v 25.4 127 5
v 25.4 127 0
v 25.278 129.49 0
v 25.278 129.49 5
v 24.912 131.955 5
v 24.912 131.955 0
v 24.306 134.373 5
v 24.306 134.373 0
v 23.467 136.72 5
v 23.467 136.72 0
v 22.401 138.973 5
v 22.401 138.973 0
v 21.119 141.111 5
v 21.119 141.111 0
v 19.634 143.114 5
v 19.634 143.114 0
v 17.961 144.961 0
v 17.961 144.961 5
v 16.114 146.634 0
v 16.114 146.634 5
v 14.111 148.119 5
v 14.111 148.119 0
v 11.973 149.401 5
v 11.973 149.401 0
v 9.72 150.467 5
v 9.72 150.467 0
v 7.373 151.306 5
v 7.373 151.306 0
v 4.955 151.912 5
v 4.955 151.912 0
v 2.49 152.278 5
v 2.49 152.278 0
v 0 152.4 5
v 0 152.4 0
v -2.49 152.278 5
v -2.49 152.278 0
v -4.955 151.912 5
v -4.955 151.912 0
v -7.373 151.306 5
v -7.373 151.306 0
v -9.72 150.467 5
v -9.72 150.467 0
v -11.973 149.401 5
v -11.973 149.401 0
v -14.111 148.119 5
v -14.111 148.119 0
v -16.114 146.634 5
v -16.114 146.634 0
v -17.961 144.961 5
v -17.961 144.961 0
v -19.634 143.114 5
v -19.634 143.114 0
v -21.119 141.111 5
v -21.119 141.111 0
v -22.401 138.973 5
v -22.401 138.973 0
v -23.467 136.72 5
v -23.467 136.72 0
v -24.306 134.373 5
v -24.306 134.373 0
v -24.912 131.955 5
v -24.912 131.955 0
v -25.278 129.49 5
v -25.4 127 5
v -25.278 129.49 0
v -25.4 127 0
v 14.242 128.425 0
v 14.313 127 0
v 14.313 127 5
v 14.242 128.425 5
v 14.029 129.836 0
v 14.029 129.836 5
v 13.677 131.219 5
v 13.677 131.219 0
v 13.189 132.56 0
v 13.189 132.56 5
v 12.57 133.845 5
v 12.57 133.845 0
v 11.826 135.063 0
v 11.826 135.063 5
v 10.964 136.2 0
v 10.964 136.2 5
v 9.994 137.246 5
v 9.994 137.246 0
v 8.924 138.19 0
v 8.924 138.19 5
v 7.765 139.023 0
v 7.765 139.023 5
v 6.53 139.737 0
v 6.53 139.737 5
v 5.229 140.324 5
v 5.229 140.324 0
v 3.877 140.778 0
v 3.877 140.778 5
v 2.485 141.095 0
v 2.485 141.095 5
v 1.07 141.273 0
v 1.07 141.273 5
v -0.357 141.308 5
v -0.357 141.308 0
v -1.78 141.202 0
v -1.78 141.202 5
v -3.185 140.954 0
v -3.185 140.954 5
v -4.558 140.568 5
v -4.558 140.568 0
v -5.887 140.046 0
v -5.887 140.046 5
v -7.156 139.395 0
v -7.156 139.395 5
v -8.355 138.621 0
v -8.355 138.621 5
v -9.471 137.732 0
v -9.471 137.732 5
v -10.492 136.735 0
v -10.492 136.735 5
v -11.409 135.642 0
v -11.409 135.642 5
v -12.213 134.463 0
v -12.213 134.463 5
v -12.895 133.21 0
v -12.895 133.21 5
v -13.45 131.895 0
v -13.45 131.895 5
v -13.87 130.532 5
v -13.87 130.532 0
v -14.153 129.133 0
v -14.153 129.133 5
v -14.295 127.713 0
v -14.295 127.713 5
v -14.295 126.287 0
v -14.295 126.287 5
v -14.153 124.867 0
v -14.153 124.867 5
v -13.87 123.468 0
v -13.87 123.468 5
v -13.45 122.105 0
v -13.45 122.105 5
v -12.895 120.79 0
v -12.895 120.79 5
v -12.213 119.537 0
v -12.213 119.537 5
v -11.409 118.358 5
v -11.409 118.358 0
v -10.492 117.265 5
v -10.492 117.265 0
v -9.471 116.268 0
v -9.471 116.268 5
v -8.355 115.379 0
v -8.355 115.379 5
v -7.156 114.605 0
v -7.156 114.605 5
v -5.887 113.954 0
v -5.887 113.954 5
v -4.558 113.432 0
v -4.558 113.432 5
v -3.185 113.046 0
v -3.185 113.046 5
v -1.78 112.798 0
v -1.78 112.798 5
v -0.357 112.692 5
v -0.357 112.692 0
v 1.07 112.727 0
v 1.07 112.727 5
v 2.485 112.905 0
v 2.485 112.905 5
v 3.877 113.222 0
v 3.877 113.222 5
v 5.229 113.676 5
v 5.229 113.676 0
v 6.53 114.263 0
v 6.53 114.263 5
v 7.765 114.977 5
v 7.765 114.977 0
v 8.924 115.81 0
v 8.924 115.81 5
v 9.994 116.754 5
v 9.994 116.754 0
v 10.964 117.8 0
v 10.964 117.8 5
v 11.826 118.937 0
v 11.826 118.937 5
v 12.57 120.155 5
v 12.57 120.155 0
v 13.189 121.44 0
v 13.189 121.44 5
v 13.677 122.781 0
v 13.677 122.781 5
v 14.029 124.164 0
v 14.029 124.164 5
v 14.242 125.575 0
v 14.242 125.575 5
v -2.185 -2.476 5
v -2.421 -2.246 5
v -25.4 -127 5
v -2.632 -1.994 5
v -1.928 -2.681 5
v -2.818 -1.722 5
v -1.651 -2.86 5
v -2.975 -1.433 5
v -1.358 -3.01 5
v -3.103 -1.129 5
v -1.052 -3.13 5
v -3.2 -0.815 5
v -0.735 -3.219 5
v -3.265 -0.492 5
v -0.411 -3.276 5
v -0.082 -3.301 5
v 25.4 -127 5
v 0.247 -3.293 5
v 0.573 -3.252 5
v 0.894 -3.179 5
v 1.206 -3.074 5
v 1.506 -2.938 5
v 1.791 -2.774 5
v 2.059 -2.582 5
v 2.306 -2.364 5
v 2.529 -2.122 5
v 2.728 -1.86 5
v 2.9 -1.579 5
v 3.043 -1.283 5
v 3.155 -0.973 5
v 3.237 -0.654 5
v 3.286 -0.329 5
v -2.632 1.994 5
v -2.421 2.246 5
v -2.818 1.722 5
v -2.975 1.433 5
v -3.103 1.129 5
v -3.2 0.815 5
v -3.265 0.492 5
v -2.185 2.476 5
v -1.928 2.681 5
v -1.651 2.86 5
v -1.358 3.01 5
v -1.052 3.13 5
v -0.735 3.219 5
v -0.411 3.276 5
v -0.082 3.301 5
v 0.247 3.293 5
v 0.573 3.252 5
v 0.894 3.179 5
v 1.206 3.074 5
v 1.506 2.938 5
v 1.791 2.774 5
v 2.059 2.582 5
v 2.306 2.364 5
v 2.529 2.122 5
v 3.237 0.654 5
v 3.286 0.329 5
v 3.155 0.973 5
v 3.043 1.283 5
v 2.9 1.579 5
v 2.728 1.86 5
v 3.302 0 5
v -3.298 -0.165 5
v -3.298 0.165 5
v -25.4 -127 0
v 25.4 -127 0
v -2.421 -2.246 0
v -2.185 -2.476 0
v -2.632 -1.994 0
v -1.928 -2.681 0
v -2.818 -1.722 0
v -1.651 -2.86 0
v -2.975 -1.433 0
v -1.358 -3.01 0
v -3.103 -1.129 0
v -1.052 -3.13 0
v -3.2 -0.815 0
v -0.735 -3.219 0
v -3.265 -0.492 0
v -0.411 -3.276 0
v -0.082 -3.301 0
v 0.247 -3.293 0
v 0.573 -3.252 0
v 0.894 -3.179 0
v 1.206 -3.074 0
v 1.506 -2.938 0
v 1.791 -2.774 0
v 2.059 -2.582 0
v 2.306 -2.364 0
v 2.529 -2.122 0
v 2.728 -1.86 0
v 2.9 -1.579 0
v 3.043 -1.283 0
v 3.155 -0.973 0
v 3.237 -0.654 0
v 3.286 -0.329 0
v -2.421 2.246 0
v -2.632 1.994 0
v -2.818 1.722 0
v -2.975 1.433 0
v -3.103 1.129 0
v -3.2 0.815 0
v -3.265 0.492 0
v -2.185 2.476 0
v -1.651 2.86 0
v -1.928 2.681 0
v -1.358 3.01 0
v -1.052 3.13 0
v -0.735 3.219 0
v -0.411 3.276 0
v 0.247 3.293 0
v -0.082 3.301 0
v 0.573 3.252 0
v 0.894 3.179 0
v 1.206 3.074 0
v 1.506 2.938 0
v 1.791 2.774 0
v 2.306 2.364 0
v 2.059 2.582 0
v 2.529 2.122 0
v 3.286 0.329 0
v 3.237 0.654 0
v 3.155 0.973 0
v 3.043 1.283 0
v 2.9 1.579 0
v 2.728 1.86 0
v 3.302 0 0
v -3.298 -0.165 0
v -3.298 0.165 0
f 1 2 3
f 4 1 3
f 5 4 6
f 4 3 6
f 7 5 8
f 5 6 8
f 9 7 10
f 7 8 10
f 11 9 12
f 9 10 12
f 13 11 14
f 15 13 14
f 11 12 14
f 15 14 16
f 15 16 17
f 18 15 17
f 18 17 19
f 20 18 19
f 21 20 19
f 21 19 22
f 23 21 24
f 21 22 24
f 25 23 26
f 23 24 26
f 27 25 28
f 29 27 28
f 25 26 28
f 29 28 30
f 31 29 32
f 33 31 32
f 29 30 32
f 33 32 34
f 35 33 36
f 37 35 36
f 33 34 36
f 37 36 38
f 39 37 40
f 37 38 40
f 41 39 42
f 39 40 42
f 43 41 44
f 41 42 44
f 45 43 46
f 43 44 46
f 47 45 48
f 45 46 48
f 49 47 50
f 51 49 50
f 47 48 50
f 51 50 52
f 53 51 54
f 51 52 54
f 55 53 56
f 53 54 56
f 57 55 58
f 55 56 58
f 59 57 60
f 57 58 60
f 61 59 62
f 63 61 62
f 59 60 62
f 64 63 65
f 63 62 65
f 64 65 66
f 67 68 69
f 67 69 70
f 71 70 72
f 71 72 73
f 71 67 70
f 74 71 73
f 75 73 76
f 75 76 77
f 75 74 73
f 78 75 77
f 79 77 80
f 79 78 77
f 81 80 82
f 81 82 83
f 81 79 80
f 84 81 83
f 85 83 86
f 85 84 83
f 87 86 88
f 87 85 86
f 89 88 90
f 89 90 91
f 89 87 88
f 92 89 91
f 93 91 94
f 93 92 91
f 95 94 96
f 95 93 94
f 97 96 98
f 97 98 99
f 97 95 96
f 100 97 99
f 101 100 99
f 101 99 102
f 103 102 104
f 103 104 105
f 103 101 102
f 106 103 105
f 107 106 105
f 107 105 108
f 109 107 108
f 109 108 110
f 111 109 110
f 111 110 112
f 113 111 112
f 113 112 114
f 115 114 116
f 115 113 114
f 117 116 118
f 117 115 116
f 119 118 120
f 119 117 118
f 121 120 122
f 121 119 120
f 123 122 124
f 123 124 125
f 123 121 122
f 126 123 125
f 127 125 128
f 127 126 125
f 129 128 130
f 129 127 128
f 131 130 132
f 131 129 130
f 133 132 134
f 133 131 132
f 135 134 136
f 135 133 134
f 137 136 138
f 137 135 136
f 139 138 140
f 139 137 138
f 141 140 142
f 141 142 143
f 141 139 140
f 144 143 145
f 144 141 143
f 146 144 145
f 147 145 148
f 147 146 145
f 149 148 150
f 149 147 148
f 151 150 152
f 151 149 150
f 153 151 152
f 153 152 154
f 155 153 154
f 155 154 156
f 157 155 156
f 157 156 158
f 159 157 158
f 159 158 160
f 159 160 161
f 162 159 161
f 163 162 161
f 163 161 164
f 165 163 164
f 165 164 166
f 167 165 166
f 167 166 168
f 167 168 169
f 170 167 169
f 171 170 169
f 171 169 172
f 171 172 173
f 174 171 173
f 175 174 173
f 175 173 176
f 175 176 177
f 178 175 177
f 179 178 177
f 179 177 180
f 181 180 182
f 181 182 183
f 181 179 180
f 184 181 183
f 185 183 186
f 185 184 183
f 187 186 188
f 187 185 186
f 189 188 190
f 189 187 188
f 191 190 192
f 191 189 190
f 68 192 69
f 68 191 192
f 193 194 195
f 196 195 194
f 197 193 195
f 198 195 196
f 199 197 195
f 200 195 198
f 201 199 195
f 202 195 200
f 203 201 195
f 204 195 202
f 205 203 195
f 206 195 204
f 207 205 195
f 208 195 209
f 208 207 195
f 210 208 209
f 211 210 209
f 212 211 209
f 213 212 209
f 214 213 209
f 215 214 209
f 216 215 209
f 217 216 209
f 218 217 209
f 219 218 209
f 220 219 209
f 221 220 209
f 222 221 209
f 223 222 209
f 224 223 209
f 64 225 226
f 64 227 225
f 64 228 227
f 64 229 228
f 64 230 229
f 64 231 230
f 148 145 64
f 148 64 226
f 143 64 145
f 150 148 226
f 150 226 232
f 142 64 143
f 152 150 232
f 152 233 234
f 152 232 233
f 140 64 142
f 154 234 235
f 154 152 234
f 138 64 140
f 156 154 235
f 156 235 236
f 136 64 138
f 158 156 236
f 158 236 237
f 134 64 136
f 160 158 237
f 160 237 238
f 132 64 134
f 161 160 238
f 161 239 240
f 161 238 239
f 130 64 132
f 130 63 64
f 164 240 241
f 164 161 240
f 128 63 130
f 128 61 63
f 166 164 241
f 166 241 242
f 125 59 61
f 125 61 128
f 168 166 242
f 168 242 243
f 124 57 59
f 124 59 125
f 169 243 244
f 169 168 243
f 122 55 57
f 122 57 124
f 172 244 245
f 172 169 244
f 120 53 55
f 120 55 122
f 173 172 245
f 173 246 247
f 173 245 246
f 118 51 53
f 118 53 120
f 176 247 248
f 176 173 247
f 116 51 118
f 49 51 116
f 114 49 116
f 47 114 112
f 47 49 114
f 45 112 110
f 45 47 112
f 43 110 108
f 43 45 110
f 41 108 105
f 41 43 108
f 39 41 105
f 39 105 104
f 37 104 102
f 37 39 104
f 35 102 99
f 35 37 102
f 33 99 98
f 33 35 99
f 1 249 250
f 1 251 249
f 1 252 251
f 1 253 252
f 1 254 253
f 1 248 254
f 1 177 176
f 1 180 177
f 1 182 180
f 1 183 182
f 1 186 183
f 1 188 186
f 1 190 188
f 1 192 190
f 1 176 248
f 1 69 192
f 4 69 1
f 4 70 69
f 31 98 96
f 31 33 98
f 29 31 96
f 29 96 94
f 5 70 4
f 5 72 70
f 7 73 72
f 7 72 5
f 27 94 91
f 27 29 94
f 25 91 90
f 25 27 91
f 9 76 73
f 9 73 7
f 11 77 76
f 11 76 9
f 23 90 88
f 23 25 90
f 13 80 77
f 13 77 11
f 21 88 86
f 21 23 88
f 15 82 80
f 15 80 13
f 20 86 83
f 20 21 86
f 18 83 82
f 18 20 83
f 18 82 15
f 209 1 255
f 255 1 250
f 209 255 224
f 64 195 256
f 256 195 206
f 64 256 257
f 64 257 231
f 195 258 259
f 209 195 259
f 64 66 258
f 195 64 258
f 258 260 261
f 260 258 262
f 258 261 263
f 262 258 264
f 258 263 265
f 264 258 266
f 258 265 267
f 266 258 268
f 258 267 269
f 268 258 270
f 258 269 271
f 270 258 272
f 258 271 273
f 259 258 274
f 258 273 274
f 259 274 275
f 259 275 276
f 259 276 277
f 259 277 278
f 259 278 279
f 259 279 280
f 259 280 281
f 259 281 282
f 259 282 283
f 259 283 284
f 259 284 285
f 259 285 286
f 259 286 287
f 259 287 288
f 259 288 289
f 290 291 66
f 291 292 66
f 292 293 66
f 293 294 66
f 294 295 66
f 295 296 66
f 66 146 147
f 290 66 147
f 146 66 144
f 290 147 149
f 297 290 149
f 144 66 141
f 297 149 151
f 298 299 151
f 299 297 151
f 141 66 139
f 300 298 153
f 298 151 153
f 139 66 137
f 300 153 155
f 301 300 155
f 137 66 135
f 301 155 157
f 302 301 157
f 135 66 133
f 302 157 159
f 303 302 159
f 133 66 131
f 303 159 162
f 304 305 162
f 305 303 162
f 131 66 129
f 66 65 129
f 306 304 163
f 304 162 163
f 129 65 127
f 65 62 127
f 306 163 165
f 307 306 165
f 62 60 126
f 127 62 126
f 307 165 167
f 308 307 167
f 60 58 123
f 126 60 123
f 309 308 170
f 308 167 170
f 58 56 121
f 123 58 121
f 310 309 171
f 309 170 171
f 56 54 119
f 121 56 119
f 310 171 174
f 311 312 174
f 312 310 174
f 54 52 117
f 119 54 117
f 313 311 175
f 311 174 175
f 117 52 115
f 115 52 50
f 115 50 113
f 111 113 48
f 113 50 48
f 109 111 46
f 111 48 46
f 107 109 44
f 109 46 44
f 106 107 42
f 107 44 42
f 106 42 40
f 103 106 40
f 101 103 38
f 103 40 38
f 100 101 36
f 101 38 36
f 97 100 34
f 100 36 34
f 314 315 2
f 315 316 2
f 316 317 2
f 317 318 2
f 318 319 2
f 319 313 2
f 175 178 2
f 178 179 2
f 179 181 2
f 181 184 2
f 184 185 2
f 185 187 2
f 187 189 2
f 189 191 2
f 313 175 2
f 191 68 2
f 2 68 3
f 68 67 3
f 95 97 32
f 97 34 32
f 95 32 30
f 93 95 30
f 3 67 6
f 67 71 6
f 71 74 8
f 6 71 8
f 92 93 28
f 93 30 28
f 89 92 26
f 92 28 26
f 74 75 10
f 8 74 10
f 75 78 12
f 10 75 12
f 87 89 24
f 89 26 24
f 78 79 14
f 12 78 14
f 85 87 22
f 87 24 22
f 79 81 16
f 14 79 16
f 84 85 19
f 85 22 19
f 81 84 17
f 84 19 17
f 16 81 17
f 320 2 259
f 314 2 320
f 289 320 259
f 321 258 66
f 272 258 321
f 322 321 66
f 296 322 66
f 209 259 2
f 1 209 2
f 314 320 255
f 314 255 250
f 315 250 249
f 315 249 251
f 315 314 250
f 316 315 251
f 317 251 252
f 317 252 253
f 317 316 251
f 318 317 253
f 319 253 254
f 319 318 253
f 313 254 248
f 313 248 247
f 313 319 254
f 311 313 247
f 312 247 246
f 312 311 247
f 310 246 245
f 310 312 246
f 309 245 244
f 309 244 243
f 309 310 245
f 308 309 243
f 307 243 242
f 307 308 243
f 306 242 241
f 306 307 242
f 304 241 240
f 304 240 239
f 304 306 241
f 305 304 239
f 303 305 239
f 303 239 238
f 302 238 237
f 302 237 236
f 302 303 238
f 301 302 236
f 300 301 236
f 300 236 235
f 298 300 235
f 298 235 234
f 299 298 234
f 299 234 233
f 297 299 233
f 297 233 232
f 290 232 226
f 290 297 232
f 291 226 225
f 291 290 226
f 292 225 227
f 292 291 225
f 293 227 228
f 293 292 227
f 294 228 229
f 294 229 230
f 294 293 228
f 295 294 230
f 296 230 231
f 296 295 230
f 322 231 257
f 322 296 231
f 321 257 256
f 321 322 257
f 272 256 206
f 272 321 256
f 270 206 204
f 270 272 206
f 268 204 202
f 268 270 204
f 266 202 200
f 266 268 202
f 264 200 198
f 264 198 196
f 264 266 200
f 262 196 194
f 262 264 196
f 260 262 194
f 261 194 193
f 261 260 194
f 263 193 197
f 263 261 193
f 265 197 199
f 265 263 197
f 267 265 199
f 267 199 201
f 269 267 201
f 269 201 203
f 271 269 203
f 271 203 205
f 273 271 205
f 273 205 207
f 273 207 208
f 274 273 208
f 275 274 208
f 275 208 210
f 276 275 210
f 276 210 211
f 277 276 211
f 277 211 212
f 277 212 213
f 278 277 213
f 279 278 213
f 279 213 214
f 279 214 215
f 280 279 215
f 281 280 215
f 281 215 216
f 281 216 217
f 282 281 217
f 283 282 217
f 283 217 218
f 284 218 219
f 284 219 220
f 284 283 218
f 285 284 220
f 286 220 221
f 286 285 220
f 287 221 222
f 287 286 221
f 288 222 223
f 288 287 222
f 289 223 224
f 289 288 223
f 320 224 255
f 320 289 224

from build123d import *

# Parameters (mm, degrees)
F0_R     = 3.302
F0_R_2   = 14.3129
F1_DEPTH = 5


with BuildPart() as f1:
    # F0 (on Top) → F1 (new body)
    with BuildSketch(Plane.XY):
        with BuildLine():
            Line((-25.4, -127), (25.4, -127))
            Line((25.4, -127), (25.4, 127))
            ThreePointArc((25.4, 127), (0, 152.4), (-25.4, 127))
            Line((-25.4, 127), (-25.4, -127))
        make_face()
        Circle(F0_R, mode=Mode.SUBTRACT)
        with Locations((0, 127)):
            Circle(F0_R_2, mode=Mode.SUBTRACT)
    extrude(amount=F1_DEPTH)


solid = f1.part
